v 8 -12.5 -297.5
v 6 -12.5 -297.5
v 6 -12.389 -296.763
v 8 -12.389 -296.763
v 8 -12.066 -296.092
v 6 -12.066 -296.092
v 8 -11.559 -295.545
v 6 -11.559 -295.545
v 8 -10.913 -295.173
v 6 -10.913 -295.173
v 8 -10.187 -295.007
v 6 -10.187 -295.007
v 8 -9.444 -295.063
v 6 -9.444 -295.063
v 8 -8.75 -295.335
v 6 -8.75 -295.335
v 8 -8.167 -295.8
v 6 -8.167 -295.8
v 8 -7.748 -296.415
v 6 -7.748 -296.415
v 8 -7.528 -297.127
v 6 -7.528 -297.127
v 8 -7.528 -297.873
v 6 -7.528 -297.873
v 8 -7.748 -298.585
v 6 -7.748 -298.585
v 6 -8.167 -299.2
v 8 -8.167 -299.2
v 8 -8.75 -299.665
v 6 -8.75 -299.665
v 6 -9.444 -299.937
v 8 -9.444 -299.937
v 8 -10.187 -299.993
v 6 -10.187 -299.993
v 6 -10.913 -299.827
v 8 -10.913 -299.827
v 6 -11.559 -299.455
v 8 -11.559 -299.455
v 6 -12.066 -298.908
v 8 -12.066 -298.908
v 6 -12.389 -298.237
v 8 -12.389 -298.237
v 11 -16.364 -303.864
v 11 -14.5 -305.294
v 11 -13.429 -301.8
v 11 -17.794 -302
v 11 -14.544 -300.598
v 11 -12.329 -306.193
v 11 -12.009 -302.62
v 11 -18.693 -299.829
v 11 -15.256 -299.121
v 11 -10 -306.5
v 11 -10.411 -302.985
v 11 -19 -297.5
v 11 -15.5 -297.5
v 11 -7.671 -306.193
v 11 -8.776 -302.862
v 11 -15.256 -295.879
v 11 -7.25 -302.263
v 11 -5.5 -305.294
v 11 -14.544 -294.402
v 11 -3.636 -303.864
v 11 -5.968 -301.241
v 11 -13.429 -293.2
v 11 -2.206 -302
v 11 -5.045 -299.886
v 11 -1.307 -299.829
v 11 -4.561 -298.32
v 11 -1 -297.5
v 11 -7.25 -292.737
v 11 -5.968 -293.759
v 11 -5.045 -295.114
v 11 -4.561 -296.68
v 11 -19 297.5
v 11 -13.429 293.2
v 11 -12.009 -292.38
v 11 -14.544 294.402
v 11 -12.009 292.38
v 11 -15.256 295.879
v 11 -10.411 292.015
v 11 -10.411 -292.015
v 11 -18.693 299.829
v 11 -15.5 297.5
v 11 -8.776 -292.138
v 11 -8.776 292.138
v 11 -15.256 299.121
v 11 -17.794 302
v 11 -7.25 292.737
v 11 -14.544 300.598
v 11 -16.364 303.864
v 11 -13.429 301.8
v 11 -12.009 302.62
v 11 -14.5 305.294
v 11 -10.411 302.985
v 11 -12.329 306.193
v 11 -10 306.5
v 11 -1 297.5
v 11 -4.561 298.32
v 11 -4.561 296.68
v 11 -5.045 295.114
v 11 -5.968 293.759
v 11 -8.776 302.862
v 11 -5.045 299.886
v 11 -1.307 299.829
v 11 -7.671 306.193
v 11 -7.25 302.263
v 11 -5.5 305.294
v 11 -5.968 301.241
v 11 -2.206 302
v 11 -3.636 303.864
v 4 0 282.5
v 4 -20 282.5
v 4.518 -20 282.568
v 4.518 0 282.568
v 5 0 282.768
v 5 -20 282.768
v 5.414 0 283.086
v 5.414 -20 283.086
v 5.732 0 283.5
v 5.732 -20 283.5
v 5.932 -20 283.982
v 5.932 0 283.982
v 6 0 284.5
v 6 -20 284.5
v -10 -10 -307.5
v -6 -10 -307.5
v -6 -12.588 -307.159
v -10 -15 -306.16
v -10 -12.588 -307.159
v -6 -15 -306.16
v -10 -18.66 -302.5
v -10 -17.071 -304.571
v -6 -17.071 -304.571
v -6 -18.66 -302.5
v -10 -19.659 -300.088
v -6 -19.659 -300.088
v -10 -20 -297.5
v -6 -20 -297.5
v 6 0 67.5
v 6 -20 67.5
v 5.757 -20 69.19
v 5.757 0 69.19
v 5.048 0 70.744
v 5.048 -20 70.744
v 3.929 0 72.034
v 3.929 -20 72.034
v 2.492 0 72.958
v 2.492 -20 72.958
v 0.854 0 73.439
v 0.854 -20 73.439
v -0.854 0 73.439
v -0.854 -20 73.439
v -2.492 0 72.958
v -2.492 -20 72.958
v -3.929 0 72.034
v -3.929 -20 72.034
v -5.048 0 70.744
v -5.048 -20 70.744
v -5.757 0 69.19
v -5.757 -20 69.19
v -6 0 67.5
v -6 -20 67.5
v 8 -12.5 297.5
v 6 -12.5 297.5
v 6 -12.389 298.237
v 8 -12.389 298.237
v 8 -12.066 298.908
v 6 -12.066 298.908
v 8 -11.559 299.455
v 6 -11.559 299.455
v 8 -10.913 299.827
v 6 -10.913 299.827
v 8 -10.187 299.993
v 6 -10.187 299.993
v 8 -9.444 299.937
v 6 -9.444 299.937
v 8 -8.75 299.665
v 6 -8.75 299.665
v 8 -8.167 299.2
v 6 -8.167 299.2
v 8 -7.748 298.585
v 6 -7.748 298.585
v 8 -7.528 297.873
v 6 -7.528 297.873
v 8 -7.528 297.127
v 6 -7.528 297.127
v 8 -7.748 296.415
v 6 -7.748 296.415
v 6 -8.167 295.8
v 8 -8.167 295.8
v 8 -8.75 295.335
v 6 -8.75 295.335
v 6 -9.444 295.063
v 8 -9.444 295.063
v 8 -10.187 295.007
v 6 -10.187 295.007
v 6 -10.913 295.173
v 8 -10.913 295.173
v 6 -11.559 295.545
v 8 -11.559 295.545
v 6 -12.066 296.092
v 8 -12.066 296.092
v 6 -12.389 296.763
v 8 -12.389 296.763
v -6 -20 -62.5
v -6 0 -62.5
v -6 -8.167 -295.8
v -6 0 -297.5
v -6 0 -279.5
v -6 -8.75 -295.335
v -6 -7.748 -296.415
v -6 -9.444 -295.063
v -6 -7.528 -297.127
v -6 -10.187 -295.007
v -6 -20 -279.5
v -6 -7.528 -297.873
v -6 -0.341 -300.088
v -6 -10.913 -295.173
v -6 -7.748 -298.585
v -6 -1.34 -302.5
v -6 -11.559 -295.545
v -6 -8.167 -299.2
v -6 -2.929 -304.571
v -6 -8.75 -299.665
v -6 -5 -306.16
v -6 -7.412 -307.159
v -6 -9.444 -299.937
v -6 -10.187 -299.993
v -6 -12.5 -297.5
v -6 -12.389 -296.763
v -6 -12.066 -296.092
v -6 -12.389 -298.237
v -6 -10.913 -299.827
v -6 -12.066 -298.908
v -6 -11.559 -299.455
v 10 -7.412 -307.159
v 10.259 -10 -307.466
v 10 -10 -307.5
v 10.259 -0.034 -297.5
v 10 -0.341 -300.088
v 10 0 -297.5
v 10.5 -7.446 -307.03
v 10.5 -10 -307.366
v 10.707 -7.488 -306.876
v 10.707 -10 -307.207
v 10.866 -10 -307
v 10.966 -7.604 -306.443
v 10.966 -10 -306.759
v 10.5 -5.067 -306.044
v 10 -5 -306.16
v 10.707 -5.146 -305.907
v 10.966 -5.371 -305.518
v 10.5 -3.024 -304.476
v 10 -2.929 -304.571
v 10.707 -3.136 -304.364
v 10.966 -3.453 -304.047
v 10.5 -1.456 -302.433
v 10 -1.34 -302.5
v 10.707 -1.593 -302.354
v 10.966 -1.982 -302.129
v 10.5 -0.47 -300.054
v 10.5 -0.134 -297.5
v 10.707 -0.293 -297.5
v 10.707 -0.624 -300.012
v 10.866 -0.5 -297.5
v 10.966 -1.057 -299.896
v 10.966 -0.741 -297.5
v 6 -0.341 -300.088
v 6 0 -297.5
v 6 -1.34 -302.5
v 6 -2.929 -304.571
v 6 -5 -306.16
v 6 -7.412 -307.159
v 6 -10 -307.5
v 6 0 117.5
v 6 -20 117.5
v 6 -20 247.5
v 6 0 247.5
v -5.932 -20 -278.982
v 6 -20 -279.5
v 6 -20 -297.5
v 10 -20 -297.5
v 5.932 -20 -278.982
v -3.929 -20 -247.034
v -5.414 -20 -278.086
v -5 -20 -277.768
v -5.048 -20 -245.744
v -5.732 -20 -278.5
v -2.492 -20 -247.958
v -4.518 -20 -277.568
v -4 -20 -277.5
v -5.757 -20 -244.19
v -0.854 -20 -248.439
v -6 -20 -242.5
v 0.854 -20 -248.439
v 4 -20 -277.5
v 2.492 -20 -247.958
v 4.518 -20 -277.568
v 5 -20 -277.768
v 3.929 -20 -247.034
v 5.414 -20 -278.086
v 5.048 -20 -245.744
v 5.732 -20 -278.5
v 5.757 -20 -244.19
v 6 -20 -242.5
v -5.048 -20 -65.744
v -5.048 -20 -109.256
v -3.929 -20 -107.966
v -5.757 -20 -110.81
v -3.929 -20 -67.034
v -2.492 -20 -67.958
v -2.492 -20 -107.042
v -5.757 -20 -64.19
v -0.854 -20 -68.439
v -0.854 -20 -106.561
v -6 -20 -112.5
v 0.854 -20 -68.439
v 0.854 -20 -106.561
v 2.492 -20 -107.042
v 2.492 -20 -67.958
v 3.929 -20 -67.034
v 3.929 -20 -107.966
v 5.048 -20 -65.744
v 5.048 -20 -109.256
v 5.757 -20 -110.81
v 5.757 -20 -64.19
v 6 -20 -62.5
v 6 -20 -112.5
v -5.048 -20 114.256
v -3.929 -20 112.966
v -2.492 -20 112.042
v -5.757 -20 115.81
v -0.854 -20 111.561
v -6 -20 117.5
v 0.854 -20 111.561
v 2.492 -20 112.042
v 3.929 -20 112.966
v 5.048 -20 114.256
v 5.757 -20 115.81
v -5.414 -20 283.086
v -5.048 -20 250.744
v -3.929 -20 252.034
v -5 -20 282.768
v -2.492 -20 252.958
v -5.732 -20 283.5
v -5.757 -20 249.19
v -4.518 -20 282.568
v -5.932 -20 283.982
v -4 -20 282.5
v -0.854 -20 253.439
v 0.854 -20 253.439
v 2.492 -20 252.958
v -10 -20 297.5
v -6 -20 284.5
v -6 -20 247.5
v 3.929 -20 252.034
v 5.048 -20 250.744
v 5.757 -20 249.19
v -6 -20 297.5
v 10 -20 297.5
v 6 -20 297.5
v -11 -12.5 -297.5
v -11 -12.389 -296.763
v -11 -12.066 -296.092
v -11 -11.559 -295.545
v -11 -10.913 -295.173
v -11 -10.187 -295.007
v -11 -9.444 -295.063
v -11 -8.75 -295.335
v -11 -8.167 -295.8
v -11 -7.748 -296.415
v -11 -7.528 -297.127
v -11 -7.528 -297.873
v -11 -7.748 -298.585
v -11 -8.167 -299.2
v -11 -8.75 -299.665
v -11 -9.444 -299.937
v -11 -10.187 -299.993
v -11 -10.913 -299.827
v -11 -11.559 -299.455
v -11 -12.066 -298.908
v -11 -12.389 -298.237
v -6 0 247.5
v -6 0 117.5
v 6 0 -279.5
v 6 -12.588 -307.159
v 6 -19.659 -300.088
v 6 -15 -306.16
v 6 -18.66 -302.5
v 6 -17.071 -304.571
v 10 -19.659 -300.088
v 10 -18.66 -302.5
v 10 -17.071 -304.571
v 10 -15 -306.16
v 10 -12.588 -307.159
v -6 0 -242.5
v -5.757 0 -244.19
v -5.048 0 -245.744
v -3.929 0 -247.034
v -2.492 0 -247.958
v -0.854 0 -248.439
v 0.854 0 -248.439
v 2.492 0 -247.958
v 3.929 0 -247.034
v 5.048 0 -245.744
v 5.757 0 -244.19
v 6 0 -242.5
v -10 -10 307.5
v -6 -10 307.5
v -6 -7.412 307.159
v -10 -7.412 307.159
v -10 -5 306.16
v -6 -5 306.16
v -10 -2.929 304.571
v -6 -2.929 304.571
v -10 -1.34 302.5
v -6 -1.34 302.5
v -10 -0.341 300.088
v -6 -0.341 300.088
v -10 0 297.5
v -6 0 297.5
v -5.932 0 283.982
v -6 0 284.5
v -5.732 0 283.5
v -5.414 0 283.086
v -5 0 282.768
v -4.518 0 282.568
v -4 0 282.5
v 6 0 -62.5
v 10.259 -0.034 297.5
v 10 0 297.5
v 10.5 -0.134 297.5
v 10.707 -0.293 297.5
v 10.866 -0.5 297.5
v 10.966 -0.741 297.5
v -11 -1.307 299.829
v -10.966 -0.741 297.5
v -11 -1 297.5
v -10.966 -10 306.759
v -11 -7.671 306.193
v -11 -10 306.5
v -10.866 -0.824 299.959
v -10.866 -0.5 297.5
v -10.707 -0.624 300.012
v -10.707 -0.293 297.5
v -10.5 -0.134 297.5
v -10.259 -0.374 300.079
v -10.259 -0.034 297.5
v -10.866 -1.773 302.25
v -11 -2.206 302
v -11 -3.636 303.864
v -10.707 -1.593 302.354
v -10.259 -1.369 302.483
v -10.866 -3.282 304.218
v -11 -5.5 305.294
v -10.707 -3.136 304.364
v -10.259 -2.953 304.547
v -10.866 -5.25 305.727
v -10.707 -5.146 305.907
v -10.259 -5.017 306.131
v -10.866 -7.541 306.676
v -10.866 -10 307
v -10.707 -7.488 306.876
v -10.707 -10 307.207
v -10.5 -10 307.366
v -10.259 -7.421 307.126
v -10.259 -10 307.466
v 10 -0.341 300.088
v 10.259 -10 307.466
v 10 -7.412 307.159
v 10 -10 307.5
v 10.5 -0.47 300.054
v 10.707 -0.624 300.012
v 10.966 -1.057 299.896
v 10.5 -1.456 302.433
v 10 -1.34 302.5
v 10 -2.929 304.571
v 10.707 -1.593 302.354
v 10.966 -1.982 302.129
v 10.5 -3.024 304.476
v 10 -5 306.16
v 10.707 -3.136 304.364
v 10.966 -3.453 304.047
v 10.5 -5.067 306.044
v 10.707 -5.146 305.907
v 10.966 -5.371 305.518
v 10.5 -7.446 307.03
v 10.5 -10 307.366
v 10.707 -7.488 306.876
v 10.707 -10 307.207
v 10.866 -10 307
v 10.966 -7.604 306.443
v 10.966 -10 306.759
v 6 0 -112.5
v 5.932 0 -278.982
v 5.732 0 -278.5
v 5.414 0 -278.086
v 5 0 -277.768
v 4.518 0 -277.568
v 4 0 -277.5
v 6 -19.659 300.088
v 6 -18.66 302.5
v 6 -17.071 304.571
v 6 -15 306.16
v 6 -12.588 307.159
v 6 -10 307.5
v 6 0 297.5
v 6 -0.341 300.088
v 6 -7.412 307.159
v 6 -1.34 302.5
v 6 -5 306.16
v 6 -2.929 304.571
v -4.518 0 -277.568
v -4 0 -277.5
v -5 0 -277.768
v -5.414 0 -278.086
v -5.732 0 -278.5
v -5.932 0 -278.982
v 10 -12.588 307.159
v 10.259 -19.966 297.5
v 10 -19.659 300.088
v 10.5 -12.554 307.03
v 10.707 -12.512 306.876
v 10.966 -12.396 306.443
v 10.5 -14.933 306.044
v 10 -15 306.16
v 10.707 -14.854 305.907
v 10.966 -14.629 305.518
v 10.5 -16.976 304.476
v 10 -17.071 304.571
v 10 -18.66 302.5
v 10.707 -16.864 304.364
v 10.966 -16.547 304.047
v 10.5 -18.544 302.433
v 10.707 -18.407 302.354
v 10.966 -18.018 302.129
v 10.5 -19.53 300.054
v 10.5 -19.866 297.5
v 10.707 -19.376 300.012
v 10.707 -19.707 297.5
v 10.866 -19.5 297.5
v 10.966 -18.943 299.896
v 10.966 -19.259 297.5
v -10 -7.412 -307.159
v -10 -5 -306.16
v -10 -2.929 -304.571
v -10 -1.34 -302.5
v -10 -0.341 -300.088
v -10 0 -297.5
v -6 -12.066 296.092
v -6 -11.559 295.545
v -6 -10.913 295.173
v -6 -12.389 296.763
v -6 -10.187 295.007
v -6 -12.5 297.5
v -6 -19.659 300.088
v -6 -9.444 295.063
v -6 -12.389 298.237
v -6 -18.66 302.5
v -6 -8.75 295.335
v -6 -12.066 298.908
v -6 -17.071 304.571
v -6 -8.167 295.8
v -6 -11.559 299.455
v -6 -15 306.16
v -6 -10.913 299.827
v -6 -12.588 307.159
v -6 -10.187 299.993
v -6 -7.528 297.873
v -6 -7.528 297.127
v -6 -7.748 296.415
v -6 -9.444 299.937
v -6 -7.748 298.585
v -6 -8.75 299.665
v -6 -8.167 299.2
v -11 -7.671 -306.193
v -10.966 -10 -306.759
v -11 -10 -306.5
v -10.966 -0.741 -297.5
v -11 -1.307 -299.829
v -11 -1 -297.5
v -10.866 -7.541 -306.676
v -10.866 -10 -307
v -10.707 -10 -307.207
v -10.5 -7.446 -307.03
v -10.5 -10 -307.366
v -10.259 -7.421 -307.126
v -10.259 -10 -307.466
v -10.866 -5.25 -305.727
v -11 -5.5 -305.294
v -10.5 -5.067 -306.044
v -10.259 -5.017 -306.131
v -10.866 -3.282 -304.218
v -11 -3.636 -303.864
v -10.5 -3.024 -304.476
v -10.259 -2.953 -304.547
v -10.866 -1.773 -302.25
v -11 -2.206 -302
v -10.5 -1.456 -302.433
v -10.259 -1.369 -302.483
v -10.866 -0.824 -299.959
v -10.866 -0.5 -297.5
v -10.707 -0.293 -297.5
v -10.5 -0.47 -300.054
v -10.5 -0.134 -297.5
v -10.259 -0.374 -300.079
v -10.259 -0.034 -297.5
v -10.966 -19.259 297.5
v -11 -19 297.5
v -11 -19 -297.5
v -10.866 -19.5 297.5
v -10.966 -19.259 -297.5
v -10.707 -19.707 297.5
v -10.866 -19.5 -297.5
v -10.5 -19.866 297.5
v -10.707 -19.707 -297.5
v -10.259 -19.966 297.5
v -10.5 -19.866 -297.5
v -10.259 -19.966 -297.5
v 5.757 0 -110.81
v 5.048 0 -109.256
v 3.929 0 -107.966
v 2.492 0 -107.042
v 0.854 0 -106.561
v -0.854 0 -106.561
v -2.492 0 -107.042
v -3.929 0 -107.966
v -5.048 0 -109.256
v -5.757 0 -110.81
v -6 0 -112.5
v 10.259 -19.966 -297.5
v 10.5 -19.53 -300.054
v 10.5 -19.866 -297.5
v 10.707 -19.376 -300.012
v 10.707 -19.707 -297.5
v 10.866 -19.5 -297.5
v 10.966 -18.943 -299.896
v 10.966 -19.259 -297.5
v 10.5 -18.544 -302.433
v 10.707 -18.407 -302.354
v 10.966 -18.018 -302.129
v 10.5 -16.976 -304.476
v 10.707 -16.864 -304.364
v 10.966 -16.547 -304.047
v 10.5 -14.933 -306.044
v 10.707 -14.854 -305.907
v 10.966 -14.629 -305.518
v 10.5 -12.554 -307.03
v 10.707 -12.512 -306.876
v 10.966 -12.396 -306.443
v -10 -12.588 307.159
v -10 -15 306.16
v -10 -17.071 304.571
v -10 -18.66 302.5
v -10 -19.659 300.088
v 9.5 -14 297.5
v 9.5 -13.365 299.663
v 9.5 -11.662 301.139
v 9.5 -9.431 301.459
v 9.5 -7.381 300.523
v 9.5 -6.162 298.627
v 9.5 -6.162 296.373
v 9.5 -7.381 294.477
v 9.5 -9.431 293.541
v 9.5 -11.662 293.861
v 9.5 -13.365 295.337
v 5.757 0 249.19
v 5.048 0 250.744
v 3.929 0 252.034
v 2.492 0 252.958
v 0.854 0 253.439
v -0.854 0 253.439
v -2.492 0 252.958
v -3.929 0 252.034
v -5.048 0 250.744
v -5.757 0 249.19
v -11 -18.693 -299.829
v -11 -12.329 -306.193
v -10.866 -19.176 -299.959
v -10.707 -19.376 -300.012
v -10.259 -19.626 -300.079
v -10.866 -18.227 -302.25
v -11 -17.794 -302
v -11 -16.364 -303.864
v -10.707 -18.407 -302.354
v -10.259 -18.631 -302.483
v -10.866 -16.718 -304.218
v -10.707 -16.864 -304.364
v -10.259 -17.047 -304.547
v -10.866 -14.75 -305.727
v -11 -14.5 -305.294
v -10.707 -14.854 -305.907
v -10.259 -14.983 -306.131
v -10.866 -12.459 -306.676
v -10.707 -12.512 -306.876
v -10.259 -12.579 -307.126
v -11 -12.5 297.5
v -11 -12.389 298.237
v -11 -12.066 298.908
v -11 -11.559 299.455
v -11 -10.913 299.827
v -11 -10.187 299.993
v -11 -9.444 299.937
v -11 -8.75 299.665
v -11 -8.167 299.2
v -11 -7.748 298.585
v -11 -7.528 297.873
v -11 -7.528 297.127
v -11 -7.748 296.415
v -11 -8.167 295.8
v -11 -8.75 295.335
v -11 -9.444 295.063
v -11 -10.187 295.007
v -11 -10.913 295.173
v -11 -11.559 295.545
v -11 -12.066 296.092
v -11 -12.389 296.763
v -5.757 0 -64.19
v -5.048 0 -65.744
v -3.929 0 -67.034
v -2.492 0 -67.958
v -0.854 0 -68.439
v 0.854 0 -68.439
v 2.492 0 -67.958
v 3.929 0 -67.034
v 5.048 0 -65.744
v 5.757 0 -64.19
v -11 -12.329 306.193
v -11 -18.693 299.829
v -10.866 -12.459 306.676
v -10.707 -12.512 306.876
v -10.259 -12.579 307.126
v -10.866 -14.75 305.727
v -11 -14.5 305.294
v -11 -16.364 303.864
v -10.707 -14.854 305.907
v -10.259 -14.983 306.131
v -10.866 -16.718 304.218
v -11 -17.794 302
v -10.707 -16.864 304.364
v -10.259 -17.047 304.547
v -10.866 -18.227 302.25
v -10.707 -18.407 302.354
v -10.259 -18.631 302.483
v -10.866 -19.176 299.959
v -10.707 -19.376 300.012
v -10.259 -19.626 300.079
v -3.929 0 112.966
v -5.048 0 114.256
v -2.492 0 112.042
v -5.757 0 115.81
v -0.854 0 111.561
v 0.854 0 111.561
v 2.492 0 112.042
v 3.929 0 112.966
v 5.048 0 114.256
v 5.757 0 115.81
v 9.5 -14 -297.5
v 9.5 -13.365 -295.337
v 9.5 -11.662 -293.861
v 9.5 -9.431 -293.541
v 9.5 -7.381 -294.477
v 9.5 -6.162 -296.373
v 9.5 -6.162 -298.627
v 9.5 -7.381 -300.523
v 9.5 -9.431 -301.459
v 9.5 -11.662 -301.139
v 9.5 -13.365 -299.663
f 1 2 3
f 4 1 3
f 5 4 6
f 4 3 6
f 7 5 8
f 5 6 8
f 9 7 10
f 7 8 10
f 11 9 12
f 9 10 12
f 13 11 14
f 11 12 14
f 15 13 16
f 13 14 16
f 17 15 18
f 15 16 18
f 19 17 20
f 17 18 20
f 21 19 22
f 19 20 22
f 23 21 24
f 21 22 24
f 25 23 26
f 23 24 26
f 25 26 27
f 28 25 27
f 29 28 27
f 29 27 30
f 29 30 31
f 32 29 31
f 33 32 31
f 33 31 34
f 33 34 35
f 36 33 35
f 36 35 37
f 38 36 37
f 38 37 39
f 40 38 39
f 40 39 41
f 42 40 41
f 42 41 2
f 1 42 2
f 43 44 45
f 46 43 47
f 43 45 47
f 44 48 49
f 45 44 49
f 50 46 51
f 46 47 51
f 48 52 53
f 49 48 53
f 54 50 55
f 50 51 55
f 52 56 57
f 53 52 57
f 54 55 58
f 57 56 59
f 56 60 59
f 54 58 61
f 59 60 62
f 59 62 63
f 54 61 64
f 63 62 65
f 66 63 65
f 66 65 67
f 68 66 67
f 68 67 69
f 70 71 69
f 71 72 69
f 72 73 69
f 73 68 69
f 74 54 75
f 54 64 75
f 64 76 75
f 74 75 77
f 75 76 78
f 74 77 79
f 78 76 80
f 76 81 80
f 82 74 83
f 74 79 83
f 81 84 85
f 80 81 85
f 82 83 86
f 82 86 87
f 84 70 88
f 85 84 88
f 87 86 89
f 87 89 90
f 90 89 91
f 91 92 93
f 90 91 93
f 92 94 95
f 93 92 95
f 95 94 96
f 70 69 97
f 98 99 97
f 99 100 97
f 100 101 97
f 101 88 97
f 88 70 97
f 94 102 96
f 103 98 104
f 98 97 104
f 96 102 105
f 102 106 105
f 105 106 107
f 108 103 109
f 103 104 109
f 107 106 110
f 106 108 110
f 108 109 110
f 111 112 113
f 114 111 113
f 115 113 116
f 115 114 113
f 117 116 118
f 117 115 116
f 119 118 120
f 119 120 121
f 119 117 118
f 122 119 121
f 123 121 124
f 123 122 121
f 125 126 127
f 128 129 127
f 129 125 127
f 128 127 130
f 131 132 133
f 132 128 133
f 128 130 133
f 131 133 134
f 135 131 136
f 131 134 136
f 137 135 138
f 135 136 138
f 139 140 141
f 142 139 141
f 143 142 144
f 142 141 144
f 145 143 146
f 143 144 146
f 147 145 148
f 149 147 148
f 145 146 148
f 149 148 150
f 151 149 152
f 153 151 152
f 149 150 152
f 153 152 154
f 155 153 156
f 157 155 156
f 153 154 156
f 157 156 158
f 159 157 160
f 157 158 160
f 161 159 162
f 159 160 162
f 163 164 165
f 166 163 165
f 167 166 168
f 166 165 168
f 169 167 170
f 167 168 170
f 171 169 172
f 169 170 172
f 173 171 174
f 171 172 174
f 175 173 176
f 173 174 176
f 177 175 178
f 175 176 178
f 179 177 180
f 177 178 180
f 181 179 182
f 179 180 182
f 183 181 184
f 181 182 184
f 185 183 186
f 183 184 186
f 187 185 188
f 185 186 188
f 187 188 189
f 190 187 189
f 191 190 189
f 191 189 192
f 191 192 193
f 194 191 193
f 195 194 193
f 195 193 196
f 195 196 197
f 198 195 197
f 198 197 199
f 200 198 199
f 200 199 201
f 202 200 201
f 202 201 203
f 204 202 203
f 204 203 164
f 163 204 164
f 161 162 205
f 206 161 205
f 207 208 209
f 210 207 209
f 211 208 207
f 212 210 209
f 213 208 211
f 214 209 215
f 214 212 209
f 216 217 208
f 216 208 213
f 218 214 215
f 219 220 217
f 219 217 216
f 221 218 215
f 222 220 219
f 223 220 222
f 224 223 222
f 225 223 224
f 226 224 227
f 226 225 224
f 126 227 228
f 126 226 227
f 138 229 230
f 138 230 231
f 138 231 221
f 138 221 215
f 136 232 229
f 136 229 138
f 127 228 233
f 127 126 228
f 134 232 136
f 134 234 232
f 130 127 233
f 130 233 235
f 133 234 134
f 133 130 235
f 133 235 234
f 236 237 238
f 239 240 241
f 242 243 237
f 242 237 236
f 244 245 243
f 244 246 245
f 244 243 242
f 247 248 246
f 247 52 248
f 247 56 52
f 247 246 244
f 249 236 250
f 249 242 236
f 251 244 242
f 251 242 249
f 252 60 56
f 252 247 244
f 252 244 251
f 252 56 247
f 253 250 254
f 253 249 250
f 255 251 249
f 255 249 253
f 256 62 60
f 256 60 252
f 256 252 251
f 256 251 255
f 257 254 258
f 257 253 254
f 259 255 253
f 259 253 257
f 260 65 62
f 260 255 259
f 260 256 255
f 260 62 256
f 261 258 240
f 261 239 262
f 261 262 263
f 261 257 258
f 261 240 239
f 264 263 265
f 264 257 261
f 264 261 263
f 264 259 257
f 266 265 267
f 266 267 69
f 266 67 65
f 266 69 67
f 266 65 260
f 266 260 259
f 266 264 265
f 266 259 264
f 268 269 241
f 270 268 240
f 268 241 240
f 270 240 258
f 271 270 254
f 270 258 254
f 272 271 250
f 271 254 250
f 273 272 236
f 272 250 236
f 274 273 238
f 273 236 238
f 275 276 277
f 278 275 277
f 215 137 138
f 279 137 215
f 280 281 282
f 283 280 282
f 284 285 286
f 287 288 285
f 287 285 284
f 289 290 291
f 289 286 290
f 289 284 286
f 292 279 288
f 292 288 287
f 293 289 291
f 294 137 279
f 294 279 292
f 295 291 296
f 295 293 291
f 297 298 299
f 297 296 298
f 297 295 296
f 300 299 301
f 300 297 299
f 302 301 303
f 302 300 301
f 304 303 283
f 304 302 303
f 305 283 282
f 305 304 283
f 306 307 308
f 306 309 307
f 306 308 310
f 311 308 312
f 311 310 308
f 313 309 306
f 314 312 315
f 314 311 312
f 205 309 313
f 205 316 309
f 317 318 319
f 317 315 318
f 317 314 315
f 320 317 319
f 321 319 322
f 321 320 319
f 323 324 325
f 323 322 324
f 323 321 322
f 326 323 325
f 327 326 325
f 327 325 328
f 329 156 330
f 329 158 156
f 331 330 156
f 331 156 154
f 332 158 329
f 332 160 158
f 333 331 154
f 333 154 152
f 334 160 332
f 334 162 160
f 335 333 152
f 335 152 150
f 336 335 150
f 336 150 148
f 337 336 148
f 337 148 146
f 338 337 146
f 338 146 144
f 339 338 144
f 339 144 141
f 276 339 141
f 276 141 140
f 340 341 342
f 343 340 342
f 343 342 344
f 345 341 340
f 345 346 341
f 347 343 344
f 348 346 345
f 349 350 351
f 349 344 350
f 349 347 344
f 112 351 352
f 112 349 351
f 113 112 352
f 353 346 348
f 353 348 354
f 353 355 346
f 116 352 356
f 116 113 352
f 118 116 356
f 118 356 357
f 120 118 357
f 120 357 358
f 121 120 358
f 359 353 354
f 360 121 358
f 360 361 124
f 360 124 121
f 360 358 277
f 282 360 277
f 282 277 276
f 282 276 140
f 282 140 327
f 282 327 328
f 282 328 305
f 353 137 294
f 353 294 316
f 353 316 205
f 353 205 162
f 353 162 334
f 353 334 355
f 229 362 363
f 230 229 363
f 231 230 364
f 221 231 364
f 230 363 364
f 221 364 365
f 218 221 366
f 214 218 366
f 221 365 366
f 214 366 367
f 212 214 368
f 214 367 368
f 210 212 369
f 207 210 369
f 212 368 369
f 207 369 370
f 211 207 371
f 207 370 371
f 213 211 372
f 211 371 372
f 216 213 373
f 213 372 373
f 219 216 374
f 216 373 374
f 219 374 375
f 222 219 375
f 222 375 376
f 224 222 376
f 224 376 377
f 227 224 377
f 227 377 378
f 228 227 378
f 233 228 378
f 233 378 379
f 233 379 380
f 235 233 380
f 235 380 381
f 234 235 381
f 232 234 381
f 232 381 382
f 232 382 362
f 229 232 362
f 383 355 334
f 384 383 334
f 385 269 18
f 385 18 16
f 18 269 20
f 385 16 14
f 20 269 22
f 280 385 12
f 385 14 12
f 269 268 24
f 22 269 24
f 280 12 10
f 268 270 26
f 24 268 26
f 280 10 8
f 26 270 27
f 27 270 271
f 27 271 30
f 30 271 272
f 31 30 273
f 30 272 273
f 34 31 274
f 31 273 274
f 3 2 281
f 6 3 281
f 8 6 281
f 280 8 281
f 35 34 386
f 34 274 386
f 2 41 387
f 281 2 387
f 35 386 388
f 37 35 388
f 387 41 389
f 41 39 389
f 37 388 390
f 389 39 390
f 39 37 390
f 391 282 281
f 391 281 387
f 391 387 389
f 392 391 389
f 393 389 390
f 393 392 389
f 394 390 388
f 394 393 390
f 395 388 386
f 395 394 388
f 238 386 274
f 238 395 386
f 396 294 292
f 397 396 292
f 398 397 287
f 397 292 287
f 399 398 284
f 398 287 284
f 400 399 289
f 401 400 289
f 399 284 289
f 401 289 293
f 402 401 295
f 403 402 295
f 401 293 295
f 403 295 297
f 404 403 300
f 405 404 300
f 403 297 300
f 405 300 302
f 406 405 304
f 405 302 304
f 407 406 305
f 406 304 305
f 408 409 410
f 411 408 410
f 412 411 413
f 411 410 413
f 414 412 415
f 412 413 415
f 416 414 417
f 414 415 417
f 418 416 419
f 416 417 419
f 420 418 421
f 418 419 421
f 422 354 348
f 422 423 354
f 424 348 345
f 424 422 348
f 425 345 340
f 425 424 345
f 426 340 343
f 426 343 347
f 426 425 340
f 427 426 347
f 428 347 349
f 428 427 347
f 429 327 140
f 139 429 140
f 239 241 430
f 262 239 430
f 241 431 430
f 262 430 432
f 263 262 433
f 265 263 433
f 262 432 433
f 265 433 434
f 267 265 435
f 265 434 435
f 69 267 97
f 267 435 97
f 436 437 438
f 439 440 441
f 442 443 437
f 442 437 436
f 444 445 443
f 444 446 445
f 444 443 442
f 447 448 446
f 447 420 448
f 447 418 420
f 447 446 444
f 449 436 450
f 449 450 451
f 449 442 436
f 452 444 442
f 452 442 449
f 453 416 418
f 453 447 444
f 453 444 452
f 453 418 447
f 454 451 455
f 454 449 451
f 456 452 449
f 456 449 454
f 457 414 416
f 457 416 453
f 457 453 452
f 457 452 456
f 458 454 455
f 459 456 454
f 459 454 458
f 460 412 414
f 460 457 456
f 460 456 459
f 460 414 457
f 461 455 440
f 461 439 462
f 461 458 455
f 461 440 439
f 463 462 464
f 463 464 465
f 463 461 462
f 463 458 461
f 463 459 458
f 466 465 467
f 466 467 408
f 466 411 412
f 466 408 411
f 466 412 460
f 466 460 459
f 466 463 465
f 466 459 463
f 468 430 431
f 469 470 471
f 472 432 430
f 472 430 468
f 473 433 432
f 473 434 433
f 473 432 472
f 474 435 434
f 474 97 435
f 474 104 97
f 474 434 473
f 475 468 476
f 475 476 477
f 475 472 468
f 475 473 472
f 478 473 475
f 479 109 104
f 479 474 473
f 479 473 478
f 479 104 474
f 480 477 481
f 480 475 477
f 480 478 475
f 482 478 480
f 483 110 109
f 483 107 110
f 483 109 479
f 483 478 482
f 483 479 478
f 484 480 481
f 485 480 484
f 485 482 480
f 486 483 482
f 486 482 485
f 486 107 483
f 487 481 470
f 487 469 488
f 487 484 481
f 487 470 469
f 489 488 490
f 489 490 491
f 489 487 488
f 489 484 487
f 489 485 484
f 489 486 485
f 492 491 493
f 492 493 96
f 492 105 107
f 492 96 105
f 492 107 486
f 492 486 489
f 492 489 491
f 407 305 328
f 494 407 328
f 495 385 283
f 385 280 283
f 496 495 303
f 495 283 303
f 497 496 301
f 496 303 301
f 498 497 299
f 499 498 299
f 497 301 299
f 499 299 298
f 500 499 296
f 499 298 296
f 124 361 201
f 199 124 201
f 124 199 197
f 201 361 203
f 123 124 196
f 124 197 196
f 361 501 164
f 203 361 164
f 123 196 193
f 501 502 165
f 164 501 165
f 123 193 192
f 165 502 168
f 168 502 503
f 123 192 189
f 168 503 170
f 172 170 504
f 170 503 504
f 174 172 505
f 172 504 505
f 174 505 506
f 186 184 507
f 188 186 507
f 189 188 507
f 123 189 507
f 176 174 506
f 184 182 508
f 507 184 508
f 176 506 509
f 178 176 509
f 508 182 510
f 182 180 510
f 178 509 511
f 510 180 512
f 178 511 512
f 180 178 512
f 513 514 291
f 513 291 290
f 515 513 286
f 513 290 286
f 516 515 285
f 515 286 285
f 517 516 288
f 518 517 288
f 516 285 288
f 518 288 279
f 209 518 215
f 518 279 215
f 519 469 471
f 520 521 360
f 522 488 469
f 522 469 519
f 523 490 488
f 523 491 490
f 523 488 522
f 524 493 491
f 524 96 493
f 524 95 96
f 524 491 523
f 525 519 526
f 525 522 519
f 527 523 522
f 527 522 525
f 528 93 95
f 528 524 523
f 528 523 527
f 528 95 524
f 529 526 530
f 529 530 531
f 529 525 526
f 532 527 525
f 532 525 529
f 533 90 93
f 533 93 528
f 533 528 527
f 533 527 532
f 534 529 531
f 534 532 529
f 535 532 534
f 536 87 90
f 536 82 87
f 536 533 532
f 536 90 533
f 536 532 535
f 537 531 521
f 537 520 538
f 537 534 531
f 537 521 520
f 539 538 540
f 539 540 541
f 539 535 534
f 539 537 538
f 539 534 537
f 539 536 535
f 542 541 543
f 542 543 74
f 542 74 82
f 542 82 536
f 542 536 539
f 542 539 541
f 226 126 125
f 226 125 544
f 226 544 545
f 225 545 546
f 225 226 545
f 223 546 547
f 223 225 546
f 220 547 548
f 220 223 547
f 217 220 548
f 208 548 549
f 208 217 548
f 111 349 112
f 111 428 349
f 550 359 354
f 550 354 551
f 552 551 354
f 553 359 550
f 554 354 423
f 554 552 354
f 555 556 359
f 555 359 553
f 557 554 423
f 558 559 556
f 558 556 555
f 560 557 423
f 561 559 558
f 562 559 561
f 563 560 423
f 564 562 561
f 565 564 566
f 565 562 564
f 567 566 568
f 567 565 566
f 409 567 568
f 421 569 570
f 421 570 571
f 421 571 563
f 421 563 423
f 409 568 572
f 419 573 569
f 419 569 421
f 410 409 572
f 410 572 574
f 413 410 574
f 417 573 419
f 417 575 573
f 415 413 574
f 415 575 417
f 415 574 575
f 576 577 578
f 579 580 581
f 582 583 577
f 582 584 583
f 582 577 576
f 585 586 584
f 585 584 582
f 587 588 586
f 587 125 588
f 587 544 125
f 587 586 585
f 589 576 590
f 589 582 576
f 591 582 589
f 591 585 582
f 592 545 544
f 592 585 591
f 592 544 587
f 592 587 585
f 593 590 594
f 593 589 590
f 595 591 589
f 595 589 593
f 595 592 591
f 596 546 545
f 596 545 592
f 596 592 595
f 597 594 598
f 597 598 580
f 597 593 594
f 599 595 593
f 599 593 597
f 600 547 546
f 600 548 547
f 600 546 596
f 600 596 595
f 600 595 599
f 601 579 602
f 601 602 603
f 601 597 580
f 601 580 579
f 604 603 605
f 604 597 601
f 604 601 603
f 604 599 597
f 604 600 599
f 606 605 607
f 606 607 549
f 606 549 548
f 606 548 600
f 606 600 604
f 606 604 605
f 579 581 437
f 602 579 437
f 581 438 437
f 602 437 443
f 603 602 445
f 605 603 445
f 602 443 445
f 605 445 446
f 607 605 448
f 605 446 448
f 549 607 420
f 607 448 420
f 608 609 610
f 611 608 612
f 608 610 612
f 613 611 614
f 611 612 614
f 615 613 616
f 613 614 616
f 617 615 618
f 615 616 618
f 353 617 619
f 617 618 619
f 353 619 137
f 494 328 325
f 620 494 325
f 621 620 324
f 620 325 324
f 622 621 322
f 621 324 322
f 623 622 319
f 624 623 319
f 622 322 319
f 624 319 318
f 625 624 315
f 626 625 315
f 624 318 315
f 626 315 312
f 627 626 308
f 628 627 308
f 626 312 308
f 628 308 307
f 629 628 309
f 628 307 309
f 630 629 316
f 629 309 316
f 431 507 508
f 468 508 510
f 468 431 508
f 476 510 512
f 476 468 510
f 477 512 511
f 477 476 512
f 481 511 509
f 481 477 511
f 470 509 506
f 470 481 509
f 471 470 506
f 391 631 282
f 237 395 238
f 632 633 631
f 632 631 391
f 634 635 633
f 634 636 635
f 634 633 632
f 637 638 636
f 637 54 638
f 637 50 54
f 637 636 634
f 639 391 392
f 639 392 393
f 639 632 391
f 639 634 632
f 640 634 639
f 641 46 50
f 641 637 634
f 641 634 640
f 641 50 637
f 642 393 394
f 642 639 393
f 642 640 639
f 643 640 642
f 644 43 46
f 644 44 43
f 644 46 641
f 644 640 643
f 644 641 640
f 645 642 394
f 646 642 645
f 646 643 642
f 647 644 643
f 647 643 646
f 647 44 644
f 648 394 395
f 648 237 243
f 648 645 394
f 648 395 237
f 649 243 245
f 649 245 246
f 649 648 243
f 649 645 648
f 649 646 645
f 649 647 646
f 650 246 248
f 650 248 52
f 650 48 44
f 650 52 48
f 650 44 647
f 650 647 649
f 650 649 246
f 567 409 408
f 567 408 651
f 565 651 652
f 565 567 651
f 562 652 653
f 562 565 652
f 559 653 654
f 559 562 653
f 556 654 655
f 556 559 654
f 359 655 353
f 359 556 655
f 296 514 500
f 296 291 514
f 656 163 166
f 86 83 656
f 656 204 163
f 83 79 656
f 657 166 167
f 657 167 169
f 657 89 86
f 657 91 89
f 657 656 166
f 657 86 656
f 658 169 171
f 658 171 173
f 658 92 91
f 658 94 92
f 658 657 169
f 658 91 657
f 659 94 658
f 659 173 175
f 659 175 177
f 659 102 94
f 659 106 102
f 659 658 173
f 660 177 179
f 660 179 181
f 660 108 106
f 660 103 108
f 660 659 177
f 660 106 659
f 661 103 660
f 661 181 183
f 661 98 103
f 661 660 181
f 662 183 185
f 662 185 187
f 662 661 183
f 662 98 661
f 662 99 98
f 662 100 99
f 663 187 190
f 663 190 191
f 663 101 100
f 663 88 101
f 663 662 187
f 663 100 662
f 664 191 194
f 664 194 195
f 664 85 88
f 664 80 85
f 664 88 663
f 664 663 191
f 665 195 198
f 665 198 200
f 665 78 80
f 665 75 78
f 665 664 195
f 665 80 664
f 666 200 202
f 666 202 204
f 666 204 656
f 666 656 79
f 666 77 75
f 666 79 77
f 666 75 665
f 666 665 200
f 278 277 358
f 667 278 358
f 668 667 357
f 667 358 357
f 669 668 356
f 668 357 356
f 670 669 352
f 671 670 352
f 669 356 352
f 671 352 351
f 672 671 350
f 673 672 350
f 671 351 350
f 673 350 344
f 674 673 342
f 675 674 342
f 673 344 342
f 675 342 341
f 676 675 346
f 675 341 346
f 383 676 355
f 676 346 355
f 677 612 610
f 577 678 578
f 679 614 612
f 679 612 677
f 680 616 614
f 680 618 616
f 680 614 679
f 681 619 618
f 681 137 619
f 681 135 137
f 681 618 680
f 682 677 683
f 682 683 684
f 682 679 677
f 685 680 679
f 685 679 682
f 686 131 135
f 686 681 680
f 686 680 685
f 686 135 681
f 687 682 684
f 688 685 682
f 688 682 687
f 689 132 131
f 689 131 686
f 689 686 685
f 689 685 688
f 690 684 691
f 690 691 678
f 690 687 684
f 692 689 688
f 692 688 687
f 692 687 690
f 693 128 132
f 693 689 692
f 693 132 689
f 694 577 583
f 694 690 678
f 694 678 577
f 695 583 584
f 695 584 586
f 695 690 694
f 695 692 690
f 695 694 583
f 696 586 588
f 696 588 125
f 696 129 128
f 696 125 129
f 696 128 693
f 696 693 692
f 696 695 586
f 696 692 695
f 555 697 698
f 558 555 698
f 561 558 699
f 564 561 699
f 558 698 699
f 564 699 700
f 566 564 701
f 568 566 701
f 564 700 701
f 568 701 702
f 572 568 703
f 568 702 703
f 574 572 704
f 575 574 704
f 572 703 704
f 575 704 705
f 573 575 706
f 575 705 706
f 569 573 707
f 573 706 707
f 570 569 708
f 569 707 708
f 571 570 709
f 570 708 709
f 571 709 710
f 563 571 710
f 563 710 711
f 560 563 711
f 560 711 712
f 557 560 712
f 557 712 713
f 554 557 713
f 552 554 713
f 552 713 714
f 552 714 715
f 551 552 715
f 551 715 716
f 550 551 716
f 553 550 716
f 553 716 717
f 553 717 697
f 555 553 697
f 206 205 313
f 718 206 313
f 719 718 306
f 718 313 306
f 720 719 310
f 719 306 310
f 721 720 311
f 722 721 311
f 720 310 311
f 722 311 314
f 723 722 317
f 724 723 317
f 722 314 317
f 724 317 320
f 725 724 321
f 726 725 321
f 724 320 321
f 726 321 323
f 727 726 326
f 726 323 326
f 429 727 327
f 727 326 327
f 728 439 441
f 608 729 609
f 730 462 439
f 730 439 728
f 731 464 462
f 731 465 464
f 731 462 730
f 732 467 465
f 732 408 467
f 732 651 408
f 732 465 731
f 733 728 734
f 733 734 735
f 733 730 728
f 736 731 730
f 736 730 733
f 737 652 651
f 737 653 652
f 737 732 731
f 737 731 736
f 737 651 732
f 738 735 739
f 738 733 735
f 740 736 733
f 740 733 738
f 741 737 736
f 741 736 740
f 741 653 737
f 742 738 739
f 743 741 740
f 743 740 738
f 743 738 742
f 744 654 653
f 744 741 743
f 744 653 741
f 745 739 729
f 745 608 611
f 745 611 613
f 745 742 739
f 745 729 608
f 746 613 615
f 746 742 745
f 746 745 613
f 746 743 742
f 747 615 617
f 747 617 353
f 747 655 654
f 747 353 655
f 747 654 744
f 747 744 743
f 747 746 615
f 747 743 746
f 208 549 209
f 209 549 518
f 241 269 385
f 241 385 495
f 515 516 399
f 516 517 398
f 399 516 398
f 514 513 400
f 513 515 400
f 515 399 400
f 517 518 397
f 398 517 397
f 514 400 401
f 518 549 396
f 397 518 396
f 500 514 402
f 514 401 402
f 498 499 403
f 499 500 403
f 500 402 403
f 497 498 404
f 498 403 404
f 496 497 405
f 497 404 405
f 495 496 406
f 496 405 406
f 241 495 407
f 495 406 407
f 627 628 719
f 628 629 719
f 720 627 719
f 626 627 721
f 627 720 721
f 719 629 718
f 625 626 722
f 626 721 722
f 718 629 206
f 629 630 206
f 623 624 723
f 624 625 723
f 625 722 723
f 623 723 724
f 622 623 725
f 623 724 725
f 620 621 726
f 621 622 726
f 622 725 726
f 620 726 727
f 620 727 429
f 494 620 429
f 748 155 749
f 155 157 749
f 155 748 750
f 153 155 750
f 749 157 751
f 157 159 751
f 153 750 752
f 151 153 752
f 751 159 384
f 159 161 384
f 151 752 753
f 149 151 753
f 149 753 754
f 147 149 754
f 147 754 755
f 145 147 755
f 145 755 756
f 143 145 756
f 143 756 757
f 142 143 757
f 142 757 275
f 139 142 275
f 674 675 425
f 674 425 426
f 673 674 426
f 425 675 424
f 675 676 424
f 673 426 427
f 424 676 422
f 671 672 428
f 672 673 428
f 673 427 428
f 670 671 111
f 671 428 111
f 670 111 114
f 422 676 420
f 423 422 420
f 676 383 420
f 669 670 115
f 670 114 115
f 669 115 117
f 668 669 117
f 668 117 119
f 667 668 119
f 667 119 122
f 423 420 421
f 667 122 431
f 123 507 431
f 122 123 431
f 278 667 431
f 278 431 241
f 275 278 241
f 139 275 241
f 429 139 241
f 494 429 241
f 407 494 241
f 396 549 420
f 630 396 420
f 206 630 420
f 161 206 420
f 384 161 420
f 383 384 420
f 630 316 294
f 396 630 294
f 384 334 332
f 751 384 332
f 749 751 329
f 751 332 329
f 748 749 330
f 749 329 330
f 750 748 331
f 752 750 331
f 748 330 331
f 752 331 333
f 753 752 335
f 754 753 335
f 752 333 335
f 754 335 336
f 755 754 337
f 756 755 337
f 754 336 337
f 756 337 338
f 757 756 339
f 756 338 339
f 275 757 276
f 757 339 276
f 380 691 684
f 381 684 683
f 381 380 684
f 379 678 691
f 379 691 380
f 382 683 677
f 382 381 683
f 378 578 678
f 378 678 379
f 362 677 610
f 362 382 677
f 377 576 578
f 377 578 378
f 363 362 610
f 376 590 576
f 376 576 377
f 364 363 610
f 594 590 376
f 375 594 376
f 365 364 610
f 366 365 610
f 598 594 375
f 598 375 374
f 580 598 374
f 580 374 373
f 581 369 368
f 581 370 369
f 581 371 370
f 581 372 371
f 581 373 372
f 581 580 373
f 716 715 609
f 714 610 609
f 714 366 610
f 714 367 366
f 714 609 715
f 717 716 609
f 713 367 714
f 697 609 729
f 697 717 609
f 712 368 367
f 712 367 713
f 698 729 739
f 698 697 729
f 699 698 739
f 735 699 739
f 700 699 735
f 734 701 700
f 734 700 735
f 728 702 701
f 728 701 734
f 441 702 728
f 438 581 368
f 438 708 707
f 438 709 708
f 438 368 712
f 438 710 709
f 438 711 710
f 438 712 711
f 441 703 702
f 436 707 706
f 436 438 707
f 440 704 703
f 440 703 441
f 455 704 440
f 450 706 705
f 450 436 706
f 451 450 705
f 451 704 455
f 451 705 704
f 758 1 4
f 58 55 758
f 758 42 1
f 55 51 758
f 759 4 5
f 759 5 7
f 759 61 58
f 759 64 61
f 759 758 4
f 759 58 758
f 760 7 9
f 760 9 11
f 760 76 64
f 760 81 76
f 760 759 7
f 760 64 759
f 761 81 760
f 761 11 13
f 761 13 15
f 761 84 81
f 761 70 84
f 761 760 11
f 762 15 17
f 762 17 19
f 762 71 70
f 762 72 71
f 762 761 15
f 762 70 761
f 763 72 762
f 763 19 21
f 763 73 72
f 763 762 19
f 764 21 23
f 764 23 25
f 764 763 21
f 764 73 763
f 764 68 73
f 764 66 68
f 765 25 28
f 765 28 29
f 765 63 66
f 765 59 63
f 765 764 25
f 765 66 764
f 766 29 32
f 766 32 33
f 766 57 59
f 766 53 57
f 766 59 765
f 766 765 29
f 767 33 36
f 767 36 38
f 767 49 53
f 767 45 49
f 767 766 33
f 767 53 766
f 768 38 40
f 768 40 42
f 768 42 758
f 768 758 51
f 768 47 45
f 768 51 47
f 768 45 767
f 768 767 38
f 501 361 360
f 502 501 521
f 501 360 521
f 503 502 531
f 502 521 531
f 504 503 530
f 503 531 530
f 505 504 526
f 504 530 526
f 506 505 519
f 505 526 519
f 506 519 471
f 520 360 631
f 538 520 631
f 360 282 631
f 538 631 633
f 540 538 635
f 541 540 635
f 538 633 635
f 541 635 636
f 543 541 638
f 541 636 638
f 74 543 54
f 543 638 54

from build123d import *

# Parameters (mm, degrees)
F0_W      = 22
F0_H      = 615
F1_DEPTH  = 20
F2_W      = 12
F2_H      = 20
F3_DEPTH  = 25
F4_W      = 12
F4_H      = 20
F5_DEPTH  = 30
F6_R      = 9.99999
F7_R      = 2.5
F8_DEPTH  = 30
F10_DEPTH = 25
F11_R     = 1
F12_SIZE  = 3
F13_R     = 2


# Not quite as in the source:
# - a fillet or chamfer is up to 0.001 mm smaller than in the source, because OpenCascade refuses the exact size


with BuildPart() as f1:
    # F0 (on Front) → F1 (new body)
    with BuildSketch(Plane.XZ):
        Rectangle(F0_W, F0_H)
    extrude(amount=F1_DEPTH)

    # F2 (on face) → F3 (cut)
    with BuildSketch(Plane.XY.offset(307.5)):
        with Locations((0, -10)):
            Rectangle(F2_W, F2_H)
    extrude(amount=-F3_DEPTH, mode=Mode.SUBTRACT)

    # F4 (on face) → F5 (cut)
    with BuildSketch(Plane(origin=(0, 0, -307.5), x_dir=(1, 0, 0), z_dir=(0, 0, -1))):
        with Locations((0, 10)):
            Rectangle(F4_W, F4_H)
    extrude(amount=-F5_DEPTH, mode=Mode.SUBTRACT)

    # F6 (radius 10 in the source; OpenCascade refuses exactly that, so slightly less here)
    f6_edges = [f1.edges().sort_by_distance(p)[0] for p in [
        (-8.5, 0, -307.5),
        (8.5, 0, -307.5),
        (8.5, -20, -307.5),
        (-8.5, -20, -307.5),
        (-8.5, -20, 307.5),
        (-8.5, 0, 307.5),
        (8.5, 0, 307.5),
        (8.5, -20, 307.5),
    ]]
    fillet(f6_edges, radius=F6_R)

    # F7 (on face) → F8 (cut)
    with BuildSketch(Plane(origin=(-11, 0, 0), x_dir=(0, -1, 0), z_dir=(-1, 0, 0))):
        with Locations((10, 297.5)):
            Circle(F7_R)
        with Locations((10, -297.5)):
            Circle(F7_R)
    extrude(amount=-F8_DEPTH, mode=Mode.SUBTRACT)

    # F9 (on face) → F10 (cut)
    with BuildSketch(Plane.XZ.offset(20)):
        with BuildLine():
            ThreePointArc((6, 247.5), (0, 253.5), (-6, 247.5))
            Line((-6, 247.5), (-6, 117.5))
            ThreePointArc((-6, 117.5), (0, 111.5), (6, 117.5))
            Line((6, 117.5), (6, 247.5))
        make_face()
        with BuildLine():
            ThreePointArc((-6, -62.5), (0, -68.5), (6, -62.5))
            Line((6, -62.5), (6, 67.5))
            ThreePointArc((6, 67.5), (0, 73.5), (-6, 67.5))
            Line((-6, 67.5), (-6, -62.5))
        make_face()
        with BuildLine():
            Line((-6, -112.5), (-6, -242.5))
            ThreePointArc((-6, -242.5), (0, -248.5), (6, -242.5))
            Line((6, -242.5), (6, -112.5))
            ThreePointArc((6, -112.5), (0, -106.5), (-6, -112.5))
        make_face()
    extrude(amount=-F10_DEPTH, mode=Mode.SUBTRACT)

    # F11
    f11_edges = [f1.edges().sort_by_distance(p)[0] for p in [
        (11, 0, 0),
        (-11, 0, 0),
    ]]
    fillet(f11_edges, radius=F11_R)

    # F12
    f12_edges = [f1.edges().sort_by_distance(p)[0] for p in [
        (11, -7.5, 297.5),
        (11, -7.5, -297.5),
    ]]
    chamfer(f12_edges, length=F12_SIZE)

    # F13
    f13_edges = [f1.edges().sort_by_distance(p)[0] for p in [
        (-6, -10, -277.5),
        (6, -10, -277.5),
        (6, -10, 282.5),
        (-6, -10, 282.5),
    ]]
    fillet(f13_edges, radius=F13_R)


solid = f1.part
